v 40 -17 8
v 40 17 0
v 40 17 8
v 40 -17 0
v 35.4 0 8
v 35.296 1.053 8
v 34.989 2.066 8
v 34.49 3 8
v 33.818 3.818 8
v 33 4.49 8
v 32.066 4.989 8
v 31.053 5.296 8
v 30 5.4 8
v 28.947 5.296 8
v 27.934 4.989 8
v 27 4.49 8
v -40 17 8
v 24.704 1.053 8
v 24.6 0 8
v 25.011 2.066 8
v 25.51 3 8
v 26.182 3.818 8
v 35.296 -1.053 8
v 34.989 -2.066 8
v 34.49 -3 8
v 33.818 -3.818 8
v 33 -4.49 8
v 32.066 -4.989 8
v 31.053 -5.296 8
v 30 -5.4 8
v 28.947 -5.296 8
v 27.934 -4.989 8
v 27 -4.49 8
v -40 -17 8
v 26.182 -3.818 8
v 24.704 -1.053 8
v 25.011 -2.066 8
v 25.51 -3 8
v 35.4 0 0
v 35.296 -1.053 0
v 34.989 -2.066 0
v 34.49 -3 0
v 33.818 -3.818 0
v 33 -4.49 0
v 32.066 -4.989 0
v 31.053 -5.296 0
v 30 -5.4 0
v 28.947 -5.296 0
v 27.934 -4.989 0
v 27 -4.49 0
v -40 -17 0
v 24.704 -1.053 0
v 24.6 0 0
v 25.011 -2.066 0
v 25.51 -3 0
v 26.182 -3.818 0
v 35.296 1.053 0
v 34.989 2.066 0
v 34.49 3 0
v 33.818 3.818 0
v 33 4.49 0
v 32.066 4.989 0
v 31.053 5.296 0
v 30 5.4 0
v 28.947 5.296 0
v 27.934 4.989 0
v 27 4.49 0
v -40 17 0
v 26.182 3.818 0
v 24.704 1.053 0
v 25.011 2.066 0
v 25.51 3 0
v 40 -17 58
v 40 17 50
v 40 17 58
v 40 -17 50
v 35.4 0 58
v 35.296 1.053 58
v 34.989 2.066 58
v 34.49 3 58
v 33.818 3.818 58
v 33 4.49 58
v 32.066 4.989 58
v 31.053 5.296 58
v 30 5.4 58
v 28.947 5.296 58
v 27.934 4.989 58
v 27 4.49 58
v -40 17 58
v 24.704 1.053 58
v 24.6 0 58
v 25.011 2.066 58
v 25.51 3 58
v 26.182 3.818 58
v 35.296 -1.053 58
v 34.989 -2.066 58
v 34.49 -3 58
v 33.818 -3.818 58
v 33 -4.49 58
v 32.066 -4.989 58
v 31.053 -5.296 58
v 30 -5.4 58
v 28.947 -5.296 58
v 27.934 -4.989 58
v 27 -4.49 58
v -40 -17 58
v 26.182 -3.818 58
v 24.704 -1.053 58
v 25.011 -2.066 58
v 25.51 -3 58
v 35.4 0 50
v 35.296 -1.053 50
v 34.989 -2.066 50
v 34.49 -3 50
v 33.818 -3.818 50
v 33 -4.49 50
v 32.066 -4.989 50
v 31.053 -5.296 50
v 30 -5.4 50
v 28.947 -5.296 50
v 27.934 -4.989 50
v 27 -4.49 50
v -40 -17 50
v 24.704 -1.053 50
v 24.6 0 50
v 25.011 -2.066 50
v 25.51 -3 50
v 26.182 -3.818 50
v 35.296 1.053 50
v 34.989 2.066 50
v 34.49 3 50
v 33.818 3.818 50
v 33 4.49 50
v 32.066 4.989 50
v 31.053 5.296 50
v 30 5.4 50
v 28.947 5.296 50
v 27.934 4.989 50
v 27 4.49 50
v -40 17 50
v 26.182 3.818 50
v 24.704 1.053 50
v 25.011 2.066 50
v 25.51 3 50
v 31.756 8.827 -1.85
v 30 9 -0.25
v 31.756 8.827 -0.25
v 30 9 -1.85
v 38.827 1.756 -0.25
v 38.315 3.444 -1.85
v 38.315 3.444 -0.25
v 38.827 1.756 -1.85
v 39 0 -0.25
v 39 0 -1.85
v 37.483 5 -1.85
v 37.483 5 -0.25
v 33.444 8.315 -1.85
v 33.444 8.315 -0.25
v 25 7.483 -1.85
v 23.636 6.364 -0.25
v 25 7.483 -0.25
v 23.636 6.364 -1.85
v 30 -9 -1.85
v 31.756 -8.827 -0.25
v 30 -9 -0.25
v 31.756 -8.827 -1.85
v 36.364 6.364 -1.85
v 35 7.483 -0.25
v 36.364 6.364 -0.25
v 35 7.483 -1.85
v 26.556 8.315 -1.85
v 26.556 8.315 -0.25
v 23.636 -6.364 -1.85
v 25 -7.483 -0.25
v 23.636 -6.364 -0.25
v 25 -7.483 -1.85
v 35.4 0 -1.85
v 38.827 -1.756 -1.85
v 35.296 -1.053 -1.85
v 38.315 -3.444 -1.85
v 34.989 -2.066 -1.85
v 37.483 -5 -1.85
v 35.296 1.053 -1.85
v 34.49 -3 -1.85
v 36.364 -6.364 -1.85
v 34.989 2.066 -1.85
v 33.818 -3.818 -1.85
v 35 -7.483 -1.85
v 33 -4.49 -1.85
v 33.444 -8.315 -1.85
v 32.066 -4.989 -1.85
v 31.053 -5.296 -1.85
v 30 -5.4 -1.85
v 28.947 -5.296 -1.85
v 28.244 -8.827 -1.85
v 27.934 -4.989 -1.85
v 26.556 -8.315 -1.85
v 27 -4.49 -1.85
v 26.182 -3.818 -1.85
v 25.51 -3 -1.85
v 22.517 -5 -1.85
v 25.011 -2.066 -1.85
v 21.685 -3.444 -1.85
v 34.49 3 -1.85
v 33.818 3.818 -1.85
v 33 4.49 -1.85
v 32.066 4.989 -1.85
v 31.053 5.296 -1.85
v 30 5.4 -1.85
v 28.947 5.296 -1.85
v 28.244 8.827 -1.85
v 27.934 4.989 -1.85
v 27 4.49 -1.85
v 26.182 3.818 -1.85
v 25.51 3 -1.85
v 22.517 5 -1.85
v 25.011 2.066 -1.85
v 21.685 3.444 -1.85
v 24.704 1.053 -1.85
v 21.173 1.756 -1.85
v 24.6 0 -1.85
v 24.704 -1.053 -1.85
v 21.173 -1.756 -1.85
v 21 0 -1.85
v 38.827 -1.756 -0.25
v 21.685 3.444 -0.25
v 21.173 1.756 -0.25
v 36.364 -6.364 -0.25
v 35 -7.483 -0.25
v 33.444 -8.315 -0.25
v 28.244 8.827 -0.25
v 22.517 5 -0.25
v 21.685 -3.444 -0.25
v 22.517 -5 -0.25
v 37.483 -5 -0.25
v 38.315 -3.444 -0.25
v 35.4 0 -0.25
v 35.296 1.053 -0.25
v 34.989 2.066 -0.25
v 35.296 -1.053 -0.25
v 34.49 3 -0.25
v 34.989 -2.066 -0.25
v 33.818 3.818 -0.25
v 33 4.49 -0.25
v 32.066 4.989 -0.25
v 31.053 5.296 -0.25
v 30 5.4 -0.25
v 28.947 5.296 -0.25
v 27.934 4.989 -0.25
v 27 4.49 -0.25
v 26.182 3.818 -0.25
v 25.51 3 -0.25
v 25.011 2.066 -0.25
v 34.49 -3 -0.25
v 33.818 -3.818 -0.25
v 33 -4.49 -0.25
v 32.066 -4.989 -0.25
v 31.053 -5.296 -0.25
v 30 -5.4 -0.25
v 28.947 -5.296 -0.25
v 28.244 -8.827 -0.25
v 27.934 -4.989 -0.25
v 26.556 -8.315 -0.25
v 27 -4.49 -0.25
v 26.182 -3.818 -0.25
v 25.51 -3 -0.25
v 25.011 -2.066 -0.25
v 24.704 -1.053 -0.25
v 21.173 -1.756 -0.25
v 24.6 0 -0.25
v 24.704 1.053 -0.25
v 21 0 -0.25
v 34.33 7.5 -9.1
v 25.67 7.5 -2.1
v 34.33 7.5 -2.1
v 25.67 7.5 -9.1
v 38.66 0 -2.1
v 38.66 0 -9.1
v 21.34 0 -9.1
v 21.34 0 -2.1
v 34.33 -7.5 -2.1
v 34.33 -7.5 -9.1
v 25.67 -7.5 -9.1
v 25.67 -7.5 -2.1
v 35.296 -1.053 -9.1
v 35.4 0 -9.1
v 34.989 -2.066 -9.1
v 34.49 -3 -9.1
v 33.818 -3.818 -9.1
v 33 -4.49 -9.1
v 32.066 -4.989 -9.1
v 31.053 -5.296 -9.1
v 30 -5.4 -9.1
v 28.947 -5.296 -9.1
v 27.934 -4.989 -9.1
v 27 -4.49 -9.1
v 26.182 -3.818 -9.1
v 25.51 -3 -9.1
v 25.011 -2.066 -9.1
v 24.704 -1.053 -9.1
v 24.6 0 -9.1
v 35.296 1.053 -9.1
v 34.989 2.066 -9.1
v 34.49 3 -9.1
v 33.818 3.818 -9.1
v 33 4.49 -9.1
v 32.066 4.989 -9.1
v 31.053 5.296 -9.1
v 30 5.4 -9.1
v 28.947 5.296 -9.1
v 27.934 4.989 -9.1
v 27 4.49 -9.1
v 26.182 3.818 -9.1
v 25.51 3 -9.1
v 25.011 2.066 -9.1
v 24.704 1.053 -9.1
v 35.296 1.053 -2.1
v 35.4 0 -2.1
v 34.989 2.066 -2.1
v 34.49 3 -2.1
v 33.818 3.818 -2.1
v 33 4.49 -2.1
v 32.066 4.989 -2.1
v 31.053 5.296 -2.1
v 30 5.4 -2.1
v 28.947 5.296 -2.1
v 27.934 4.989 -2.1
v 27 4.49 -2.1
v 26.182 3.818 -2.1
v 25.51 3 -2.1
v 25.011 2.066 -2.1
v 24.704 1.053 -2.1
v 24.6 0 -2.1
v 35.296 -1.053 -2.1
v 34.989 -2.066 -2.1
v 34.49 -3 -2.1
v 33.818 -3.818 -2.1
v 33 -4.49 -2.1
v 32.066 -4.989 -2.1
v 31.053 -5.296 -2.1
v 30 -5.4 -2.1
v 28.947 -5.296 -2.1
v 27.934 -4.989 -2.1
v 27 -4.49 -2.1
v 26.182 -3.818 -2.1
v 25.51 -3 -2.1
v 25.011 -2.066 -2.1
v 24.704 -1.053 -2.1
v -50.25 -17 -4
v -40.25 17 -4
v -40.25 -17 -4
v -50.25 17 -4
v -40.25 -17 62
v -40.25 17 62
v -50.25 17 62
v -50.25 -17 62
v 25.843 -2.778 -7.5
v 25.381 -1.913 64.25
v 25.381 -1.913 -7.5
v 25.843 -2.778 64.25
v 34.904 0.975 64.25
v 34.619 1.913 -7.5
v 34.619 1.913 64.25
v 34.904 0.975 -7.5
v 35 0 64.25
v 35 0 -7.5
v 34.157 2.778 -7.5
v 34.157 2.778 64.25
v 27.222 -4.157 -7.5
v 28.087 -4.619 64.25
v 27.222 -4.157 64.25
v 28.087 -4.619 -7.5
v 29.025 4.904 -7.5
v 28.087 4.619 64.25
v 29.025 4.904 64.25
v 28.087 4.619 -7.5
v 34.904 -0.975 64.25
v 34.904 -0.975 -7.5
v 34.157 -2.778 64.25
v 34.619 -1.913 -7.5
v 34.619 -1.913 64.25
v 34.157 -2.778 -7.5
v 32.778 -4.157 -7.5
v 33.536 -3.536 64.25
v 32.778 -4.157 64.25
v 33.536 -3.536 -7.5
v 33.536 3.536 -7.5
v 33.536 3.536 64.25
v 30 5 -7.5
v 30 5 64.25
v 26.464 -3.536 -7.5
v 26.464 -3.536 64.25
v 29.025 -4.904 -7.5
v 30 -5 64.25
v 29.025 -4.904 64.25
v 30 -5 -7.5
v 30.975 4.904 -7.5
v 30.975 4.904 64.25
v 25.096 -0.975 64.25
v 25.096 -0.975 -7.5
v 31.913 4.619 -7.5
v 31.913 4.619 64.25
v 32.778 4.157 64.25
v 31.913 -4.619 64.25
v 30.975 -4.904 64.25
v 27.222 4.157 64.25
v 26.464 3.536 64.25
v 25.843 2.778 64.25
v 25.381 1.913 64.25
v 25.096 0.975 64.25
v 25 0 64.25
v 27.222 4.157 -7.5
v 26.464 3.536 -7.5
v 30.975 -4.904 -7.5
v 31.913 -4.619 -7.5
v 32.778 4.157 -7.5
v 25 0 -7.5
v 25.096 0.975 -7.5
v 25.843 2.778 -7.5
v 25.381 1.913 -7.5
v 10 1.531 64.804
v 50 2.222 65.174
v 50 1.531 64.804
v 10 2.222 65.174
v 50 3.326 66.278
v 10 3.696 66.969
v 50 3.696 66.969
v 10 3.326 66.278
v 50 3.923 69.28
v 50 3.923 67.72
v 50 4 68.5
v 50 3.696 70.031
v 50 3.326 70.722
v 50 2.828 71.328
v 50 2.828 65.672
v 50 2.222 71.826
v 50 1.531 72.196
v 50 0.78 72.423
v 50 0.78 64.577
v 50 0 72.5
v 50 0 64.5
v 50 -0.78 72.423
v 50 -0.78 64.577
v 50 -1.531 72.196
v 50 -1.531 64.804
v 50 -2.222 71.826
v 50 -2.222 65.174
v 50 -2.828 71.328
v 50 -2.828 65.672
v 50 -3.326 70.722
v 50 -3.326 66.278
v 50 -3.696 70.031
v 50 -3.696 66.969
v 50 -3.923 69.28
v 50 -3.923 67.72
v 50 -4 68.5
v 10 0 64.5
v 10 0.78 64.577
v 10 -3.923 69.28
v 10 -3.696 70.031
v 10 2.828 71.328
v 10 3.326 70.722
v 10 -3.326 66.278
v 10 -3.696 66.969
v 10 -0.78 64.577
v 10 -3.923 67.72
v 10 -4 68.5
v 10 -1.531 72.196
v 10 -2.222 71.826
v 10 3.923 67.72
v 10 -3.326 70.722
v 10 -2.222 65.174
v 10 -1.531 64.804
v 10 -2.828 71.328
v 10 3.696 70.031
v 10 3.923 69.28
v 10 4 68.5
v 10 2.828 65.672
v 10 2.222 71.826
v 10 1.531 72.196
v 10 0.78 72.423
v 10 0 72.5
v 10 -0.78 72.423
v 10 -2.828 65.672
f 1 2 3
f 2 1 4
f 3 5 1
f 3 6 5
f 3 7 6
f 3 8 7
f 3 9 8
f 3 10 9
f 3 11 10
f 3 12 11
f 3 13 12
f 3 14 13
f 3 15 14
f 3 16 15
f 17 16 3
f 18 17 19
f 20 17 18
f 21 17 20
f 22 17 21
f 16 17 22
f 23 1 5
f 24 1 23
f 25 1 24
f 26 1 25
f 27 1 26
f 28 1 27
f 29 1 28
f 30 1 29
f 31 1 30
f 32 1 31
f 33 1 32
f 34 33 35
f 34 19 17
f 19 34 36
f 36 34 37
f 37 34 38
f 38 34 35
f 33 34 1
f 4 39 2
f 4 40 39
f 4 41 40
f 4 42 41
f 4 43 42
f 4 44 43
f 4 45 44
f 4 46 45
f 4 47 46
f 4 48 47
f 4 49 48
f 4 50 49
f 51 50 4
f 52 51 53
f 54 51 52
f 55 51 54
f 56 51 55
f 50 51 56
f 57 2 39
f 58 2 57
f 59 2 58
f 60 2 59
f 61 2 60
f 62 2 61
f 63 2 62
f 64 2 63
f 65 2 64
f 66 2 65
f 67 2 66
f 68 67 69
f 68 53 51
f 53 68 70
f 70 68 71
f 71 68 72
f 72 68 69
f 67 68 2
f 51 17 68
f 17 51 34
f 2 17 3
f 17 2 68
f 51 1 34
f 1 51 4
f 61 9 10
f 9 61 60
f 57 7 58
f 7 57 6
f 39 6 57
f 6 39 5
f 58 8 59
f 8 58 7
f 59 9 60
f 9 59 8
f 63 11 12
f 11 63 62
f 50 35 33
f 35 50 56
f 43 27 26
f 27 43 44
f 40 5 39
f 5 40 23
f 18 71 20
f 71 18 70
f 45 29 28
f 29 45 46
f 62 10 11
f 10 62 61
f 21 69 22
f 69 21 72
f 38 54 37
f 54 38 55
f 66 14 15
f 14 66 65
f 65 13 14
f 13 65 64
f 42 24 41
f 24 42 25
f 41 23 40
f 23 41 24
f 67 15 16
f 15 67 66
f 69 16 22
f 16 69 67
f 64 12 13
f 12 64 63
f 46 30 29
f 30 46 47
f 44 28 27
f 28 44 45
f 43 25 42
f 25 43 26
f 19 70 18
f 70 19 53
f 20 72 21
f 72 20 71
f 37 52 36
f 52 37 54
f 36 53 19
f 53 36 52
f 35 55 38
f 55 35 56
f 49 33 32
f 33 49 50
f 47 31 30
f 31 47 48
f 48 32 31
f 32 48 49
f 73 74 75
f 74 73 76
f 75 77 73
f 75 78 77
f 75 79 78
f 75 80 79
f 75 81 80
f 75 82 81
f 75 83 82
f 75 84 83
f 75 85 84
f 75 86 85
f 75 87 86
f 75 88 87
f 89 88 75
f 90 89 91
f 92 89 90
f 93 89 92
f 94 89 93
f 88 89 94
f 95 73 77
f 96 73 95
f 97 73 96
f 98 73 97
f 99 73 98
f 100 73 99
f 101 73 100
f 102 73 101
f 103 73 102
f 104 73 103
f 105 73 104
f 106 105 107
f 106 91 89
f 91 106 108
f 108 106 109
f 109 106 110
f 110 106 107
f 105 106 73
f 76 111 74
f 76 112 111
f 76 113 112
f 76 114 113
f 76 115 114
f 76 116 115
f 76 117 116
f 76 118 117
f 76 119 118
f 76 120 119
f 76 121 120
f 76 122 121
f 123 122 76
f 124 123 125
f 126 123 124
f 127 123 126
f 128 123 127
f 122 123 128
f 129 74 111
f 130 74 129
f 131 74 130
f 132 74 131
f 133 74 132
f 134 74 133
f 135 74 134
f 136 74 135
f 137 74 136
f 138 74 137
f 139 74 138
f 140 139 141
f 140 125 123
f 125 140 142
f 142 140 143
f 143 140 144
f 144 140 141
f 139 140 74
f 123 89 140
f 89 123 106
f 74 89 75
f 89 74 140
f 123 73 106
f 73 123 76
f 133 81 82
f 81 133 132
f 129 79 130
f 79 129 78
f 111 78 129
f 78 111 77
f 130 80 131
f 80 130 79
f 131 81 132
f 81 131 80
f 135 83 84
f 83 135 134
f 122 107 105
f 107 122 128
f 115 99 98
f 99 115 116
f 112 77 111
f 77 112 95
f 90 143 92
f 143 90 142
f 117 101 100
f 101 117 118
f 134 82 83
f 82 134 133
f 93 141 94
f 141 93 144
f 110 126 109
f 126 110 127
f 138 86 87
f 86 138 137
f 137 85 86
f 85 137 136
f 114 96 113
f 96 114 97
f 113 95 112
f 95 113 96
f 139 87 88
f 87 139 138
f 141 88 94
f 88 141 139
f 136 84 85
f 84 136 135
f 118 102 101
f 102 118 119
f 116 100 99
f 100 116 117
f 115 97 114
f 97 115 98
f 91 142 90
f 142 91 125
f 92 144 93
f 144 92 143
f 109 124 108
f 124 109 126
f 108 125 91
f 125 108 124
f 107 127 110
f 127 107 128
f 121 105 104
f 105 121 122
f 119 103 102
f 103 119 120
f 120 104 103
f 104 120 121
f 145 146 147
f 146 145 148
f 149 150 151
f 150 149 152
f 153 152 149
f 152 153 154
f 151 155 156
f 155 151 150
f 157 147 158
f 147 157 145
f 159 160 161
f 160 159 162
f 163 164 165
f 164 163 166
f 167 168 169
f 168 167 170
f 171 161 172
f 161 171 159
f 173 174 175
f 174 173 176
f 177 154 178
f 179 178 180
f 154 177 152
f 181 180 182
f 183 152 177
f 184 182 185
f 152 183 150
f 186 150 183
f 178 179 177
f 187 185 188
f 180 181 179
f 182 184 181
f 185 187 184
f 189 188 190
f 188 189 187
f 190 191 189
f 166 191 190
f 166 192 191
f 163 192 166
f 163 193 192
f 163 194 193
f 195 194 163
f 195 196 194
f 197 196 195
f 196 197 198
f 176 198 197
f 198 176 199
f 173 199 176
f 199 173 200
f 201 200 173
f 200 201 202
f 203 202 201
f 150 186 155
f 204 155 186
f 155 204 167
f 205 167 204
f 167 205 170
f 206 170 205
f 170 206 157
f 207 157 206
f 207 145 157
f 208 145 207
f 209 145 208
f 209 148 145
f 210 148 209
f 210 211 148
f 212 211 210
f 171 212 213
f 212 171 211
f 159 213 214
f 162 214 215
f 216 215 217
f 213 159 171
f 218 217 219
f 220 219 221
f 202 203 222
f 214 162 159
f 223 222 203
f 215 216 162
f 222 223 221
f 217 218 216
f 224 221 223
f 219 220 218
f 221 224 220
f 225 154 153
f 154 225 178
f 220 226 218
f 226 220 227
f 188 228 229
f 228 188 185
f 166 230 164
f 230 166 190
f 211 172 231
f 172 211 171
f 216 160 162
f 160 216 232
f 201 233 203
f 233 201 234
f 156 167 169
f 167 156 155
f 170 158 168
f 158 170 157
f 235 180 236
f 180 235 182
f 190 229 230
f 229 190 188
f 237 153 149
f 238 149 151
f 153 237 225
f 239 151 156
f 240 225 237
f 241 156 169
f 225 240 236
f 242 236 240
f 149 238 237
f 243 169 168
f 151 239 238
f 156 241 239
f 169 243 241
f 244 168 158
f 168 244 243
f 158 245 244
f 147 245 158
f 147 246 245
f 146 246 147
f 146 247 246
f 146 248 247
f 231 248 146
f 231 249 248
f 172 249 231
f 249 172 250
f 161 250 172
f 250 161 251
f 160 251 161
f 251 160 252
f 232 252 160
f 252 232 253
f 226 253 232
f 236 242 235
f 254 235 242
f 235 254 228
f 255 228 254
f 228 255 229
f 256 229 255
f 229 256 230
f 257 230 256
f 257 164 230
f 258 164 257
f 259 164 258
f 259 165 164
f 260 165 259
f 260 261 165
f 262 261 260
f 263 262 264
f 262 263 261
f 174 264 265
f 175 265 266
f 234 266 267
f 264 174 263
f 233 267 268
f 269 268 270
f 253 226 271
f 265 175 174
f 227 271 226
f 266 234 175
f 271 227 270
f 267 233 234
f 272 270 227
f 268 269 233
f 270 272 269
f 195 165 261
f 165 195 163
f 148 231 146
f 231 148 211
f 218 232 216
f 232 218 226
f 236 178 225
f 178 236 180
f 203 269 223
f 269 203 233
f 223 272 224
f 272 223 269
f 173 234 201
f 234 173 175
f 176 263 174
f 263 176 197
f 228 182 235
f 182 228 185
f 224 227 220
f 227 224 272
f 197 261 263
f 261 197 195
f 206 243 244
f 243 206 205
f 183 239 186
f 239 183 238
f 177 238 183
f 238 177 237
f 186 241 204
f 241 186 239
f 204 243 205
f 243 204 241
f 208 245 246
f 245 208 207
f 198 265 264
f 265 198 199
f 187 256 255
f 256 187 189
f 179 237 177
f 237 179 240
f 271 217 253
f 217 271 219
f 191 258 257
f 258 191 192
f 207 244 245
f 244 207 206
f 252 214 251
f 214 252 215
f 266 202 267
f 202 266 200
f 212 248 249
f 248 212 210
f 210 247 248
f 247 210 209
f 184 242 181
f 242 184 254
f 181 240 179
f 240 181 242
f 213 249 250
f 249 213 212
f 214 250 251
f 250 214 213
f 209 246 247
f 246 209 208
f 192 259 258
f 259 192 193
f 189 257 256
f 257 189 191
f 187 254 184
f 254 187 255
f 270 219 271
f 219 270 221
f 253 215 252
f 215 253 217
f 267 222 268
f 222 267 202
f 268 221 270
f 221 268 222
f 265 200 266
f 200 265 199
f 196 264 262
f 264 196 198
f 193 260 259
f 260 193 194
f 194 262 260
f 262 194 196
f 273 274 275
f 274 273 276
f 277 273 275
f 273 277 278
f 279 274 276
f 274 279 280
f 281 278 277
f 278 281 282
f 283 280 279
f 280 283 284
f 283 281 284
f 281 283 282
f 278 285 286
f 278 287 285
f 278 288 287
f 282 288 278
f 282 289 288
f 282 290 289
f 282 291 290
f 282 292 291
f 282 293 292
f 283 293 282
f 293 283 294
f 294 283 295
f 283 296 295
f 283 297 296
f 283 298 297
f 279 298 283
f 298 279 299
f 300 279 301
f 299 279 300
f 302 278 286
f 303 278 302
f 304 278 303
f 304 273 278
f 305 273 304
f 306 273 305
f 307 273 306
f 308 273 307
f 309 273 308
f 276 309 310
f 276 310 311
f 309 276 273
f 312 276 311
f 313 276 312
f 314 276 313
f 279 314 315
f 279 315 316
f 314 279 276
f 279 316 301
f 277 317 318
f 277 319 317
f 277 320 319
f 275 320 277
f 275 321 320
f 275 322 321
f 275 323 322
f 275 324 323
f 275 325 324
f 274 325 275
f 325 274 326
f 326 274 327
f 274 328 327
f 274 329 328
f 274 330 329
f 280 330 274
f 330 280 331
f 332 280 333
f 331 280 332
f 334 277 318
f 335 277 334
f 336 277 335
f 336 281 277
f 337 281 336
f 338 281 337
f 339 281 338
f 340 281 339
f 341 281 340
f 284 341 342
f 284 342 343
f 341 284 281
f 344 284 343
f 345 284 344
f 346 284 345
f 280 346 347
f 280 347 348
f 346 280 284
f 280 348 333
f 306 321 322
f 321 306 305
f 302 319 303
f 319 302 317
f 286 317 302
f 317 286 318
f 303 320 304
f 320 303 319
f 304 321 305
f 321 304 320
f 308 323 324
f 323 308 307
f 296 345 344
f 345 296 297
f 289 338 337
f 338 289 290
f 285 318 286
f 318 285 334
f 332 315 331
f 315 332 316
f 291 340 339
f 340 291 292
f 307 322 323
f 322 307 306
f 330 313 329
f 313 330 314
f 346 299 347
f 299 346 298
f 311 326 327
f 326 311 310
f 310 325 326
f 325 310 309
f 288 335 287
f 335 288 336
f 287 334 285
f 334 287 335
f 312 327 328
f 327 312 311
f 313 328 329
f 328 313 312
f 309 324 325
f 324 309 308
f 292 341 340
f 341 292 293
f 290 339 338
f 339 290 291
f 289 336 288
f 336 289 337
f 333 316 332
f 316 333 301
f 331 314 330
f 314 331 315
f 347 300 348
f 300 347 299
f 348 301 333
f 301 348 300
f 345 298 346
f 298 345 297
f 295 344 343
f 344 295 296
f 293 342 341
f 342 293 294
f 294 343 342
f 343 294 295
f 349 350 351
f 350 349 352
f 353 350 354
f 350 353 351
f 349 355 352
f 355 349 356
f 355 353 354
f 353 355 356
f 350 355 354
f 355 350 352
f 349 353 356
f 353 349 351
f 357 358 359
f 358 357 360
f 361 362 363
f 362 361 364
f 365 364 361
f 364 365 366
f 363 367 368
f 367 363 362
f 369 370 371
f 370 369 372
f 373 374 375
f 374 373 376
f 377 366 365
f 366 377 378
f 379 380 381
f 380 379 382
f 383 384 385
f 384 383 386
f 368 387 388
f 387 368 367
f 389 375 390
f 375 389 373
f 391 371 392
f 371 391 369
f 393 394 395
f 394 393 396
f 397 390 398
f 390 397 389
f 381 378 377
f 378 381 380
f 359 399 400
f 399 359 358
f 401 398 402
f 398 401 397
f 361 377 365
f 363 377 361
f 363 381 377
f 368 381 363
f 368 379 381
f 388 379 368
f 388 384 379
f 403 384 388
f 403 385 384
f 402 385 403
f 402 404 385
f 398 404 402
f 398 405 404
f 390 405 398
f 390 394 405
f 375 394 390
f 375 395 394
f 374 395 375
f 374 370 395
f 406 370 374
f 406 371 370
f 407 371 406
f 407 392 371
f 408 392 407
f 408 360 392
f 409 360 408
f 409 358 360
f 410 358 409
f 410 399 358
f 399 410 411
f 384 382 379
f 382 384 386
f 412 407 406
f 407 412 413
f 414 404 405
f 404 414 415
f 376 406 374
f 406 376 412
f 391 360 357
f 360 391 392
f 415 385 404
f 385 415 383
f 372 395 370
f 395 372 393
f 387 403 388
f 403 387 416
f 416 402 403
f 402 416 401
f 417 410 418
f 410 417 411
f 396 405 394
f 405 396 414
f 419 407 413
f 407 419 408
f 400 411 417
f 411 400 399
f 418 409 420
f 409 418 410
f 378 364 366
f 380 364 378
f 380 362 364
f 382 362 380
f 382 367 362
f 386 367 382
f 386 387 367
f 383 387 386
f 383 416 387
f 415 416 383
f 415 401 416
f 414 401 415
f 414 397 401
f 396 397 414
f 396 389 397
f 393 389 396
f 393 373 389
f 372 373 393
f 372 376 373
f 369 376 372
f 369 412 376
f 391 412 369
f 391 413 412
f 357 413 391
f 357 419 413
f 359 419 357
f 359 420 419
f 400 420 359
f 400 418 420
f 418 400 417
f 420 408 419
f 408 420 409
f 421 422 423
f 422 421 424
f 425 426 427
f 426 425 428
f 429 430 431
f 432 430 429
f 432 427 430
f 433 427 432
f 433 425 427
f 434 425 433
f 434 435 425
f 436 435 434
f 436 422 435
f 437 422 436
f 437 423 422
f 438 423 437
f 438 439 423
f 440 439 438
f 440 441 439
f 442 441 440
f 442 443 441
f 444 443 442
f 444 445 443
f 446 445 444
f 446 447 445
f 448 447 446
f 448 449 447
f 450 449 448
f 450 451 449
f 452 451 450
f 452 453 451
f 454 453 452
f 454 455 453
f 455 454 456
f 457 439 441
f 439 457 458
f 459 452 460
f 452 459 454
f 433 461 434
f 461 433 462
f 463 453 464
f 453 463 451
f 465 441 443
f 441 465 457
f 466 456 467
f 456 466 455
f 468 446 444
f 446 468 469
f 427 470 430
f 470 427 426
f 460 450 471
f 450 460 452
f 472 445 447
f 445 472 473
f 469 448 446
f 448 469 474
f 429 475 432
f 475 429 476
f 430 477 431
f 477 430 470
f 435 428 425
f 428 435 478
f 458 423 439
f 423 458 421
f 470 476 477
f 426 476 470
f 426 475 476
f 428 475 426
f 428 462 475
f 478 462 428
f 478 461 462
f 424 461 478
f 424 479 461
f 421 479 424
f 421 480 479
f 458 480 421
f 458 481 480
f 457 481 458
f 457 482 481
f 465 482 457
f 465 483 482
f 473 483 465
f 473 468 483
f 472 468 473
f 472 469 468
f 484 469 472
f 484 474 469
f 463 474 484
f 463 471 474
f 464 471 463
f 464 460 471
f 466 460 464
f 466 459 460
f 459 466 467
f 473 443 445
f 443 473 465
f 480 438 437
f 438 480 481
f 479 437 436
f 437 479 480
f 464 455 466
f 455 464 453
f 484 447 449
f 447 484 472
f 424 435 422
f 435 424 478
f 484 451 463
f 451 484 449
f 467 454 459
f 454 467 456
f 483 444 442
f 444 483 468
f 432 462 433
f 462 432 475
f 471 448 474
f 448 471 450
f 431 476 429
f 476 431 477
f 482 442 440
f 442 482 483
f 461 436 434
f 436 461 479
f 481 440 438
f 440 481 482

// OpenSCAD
$fn = 32;

// ------------------------------------------------------------------------
// C clamp: throat 50 mm, screw d10
// Every part is its own module, assembly() places every instance.
// ------------------------------------------------------------------------

// --- part 1 ---
module clamp_arm() {
  difference() {
    translate([-40, -17, 0]) cube([80, 34, 8]);
    translate([30, 0, -1]) cylinder(h = 10, d = 10.8);
  }
}

// --- part 2 ---
module clamp_spine() {
  difference() {
    translate([-33, -17, 0]) cube([66, 34, 10]);
  }
}

// --- part 3 ---
module clamp_screw() {
  translate([0, 0, -35.875]) cylinder(h = 71.75, d = 10);
}

// --- part 4 ---
module clamp_washer() {
  difference() {
      translate([0, 0, 0]) cylinder(h = 1.6, d = 18);
      translate([0, 0, -1]) cylinder(h = 3.6, d = 10.8);
    }
}

// --- part 5 ---
module clamp_nut() {
  difference() {
    linear_extrude(height = 7) polygon(points = [[8.66, 0], [4.33, 7.5], [-4.33, 7.5], [-8.66, 0], [-4.33, -7.5], [4.33, -7.5]]);
    translate([0, 0, -1]) cylinder(h = 9, d = 10.8);
  }
}

// --- part 6 ---
module tommy_bar() {
  translate([0, 0, -20]) cylinder(h = 40, d = 8);
}

// --- assembly ---
module assembly() {
  color([0.80, 0.24, 0.20]) translate([0, 0, 0]) rotate([0, 0, 0]) clamp_arm();
  color([0.20, 0.45, 0.75]) translate([0, 0, 50]) rotate([0, 0, 0]) clamp_arm();
  color([0.25, 0.62, 0.32]) translate([-50.25, 0, 29]) rotate([0, 90, 0]) clamp_spine();
  color([0.92, 0.70, 0.18]) translate([30, 0, 28.375]) rotate([0, 0, 0]) clamp_screw();
  color([0.58, 0.35, 0.70]) translate([30, 0, -1.85]) rotate([0, 0, 0]) clamp_washer();
  color([0.16, 0.66, 0.66]) translate([30, 0, -9.1]) rotate([0, 0, 0]) clamp_nut();
  color([0.85, 0.48, 0.18]) translate([30, 0, 68.5]) rotate([0, 90, 0]) tommy_bar();
}

assembly();
